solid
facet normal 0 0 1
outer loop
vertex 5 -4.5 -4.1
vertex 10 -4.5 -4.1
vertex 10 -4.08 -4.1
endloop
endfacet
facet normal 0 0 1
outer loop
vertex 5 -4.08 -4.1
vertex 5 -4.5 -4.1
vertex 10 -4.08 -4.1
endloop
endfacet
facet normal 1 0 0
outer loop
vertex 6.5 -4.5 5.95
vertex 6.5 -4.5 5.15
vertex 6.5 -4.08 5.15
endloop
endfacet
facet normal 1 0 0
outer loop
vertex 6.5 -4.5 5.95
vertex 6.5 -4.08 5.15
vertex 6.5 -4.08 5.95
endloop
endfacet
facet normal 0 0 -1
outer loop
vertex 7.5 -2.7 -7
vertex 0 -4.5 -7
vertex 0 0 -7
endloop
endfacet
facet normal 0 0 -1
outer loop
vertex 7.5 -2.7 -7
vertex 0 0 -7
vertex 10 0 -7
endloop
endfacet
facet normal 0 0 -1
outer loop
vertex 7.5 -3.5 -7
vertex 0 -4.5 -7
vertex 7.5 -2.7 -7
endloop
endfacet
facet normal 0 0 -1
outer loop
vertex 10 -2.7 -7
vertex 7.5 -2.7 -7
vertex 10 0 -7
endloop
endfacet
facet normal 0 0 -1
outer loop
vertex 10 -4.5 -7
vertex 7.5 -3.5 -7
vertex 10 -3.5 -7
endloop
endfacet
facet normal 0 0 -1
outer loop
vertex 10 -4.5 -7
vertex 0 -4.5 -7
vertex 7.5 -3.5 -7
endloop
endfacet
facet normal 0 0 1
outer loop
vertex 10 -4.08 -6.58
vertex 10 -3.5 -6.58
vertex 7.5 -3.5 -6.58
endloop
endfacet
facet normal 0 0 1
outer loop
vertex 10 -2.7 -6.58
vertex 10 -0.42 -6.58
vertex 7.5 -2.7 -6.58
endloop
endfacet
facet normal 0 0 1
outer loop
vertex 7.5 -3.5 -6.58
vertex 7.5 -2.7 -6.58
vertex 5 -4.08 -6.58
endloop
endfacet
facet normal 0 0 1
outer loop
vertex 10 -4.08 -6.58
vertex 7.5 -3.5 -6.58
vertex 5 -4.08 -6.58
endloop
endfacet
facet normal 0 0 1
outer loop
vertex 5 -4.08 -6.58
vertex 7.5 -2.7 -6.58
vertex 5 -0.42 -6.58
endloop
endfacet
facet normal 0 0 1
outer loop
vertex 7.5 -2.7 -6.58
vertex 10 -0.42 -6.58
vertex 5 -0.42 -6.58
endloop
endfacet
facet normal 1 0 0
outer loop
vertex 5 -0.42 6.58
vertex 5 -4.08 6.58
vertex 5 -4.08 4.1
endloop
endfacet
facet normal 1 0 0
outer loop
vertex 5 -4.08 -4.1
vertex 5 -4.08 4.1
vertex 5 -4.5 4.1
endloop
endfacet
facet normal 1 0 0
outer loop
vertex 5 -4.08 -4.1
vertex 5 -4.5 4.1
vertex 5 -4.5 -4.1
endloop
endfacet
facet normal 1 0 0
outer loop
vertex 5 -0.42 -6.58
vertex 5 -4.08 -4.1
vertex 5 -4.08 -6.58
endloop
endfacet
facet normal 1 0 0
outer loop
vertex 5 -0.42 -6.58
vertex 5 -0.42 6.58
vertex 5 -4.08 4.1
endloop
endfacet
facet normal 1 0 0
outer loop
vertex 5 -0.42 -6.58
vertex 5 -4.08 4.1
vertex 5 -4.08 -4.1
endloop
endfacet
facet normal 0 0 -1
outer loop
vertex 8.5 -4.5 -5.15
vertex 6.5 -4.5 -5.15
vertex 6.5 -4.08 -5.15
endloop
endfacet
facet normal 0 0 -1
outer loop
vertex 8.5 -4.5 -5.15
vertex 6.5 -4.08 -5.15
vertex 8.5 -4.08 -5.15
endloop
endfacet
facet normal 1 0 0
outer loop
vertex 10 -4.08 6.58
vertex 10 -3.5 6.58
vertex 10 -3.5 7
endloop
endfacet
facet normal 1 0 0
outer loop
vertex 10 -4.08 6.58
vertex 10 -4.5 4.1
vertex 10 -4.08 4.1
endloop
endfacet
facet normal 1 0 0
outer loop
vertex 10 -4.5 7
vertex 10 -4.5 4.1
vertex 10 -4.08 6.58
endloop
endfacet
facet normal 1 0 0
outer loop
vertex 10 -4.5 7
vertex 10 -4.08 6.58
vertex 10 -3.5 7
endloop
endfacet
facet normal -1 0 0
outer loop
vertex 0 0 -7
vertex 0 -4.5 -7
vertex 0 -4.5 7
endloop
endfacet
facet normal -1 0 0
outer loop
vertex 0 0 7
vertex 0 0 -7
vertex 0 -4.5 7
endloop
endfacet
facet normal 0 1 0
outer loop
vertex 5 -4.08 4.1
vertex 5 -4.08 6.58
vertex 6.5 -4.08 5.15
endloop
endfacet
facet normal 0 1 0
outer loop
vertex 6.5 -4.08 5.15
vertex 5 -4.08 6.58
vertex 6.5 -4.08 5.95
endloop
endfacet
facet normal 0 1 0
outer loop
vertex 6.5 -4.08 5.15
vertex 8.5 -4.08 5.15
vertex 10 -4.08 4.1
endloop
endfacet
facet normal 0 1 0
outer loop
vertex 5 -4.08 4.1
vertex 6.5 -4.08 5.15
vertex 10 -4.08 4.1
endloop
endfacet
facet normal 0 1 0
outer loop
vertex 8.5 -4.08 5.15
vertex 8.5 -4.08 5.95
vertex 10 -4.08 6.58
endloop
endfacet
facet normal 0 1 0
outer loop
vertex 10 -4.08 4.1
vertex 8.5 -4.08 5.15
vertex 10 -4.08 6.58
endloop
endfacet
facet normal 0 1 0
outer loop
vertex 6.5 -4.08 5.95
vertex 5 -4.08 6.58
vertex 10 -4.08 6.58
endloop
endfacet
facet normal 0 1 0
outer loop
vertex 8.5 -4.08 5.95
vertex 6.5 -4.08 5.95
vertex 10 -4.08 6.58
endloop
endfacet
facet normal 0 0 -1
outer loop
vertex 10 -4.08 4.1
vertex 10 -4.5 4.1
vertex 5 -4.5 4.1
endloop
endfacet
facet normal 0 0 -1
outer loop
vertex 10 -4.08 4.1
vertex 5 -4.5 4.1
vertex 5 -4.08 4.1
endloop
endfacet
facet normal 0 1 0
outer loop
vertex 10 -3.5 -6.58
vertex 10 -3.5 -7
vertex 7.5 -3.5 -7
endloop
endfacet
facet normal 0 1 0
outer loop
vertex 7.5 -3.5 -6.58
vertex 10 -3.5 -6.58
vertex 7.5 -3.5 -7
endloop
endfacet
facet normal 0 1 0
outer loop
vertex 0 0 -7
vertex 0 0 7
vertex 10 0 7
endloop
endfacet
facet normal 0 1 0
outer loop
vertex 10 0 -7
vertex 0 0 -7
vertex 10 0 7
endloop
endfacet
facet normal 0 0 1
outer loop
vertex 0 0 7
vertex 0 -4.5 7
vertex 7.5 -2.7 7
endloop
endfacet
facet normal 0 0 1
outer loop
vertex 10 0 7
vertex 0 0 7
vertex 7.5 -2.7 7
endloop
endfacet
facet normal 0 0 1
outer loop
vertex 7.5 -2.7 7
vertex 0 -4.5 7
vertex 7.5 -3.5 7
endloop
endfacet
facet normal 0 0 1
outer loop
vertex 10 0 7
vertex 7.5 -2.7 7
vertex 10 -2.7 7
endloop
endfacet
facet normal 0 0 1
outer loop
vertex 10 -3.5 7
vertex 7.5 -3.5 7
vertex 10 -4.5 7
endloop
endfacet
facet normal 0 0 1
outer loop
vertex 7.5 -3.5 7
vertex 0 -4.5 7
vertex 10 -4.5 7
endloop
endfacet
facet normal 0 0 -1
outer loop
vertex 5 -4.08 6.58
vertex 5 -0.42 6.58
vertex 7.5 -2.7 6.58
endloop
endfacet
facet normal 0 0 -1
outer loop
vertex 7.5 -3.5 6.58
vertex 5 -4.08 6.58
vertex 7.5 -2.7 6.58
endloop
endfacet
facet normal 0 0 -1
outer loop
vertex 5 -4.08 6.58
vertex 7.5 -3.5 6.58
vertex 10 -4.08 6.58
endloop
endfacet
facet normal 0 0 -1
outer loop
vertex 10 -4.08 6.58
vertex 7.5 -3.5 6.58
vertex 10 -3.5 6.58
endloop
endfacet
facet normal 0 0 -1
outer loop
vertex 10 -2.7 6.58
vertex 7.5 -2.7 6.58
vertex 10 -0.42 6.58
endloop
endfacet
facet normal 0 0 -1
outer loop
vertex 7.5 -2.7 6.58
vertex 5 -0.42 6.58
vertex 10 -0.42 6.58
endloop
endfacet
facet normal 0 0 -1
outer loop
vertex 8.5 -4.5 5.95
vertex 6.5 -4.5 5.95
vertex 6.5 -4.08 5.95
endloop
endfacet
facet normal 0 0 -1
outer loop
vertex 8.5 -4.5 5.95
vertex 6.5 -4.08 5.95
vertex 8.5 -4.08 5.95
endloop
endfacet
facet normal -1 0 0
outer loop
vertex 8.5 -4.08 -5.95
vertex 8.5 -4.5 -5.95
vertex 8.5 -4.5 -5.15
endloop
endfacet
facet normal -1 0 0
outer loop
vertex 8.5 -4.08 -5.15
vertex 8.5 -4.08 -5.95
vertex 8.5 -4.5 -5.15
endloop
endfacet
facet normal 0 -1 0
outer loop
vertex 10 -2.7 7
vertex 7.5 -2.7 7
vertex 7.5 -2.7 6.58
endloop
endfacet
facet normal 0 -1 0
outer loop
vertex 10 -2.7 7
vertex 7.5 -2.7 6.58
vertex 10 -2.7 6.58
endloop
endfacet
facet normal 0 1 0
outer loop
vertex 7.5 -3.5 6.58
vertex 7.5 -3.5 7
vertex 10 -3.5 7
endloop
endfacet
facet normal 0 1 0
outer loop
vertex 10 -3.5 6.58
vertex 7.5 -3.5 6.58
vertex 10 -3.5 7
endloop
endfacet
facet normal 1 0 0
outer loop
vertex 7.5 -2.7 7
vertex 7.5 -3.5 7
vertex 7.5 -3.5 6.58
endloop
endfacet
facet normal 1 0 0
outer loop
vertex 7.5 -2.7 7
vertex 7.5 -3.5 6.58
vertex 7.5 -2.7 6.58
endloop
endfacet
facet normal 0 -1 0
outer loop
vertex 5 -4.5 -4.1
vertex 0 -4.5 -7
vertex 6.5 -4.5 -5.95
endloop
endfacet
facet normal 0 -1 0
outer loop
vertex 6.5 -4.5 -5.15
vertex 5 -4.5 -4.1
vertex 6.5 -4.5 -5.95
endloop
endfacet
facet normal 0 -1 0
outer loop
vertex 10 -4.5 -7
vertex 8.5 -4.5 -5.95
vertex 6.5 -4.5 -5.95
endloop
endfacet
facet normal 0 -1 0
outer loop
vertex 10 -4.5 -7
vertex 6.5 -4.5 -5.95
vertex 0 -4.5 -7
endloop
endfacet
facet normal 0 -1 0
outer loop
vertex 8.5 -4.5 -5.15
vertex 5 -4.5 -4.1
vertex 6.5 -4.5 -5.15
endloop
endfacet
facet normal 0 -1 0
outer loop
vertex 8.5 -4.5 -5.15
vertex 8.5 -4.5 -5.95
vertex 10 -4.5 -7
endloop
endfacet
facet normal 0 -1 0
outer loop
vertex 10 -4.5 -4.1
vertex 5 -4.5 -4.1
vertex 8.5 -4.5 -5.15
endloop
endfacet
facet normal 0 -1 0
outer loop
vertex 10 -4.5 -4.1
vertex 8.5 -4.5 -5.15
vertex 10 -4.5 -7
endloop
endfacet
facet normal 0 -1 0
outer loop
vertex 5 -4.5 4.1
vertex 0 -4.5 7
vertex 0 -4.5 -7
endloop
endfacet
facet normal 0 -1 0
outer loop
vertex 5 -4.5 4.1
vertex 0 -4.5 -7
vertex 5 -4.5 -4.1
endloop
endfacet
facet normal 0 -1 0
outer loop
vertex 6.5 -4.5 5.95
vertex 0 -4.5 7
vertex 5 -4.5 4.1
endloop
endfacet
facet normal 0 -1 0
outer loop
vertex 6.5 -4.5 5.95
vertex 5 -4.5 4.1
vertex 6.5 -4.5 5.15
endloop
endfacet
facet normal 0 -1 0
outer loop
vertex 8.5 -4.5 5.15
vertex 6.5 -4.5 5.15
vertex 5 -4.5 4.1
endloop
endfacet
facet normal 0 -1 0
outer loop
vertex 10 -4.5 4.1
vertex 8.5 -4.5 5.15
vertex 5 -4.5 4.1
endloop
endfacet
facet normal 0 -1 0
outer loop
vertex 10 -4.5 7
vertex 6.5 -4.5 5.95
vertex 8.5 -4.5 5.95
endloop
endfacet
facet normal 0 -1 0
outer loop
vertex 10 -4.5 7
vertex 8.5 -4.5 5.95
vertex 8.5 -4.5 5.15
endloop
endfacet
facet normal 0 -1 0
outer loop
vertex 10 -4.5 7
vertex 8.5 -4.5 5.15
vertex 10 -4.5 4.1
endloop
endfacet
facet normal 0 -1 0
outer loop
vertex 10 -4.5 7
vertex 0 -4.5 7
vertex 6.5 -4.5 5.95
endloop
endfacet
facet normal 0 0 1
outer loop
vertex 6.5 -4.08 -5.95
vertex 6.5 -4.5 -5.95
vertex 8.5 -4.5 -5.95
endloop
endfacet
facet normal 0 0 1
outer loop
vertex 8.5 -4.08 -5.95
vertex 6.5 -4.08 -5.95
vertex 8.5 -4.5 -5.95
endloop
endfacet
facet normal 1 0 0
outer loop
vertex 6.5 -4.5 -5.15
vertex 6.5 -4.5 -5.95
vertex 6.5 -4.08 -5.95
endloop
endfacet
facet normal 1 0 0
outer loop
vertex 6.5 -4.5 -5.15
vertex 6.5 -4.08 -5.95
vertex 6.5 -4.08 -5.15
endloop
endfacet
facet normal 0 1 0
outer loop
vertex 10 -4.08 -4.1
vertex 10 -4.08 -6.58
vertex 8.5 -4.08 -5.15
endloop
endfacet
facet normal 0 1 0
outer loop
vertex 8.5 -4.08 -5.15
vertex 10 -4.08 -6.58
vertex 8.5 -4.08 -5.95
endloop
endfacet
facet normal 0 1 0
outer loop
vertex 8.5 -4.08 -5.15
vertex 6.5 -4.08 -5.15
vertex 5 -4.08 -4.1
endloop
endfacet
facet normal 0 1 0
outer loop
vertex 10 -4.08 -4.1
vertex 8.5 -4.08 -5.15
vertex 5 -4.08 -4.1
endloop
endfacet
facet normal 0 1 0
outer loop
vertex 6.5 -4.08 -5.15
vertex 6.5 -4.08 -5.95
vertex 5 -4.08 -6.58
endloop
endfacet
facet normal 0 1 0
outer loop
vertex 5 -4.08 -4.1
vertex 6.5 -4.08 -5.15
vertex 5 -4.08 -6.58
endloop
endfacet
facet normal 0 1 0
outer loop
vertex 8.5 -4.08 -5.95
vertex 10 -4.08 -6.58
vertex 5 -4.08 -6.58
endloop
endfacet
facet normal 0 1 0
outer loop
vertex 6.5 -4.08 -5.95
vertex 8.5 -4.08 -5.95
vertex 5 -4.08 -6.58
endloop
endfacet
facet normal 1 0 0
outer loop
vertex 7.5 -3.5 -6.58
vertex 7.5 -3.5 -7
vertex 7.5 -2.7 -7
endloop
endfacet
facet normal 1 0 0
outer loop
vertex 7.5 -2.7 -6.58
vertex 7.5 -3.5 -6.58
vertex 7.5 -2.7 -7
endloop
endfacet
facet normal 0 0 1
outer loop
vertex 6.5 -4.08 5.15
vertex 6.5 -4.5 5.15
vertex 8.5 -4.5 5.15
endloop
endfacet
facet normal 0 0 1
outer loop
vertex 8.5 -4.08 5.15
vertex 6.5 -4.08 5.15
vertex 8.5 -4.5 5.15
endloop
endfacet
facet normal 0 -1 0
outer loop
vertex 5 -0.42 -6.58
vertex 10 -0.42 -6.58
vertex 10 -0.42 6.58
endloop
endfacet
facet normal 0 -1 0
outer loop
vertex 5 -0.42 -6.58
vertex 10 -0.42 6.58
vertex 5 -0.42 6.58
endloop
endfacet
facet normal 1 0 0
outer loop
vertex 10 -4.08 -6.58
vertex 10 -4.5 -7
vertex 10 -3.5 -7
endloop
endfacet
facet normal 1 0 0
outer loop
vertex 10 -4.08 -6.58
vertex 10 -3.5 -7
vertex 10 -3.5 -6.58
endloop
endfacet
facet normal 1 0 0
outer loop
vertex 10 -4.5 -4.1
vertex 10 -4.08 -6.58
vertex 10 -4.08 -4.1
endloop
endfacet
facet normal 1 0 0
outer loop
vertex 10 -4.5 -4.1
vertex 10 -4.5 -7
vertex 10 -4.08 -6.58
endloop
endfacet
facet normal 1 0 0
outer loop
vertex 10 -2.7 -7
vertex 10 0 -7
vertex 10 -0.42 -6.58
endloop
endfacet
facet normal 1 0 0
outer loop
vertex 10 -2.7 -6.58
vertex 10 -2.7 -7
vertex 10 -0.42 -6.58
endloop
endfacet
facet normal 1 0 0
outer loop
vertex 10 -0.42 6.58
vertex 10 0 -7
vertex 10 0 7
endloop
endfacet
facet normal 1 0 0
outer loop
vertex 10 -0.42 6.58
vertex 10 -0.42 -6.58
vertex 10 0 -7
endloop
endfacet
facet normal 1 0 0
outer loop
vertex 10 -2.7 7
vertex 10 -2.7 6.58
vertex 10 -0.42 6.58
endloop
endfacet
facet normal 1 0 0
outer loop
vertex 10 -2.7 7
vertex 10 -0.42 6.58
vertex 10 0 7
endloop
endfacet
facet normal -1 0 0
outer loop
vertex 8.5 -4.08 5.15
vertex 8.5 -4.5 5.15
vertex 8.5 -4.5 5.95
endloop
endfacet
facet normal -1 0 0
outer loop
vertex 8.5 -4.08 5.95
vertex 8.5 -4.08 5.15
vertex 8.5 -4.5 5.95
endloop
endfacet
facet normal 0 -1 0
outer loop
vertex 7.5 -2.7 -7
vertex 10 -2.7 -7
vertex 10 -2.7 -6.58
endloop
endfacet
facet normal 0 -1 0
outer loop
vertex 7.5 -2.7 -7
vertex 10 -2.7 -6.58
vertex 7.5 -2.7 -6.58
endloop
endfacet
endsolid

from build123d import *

# Parameters (mm, degrees)
CROQUIS1_W              = 10
CROQUIS1_H              = 14
SALIENTE_EXTRUIR1_DEPTH = 4.5
CROQUIS2_W              = 8.2
CROQUIS2_H              = 4.08
CORTAR_EXTRUIR1_DEPTH   = 5
CORTAR_EXTRUIR2_REACH   = 19.455
CROQUIS3_W              = 5
CROQUIS3_H              = 3.66
CORTAR_EXTRUIR3_REACH   = 19.455
CROQUIS4_W              = 5
CROQUIS4_H              = 3.66
CORTAR_EXTRUIR4_REACH   = 19.783
CROQUIS5_W              = 2.5
CROQUIS5_H              = 0.8
CROQUIS6_W              = 2.5
CROQUIS6_H              = 0.8
CORTAR_EXTRUIR5_DEPTH   = 18.783419244
CORTAR_EXTRUIR6_REACH   = 15.01
CROQUIS7_W              = 2
CROQUIS7_H              = 0.8
CORTAR_EXTRUIR7_REACH   = 15.01
CROQUIS8_W              = 2
CROQUIS8_H              = 0.8


with BuildPart() as part:
    # Croquis1 → Saliente-Extruir1 (new body)
    with BuildSketch(Plane.XZ.offset(4.5)):
        with Locations((5, 0)):
            Rectangle(CROQUIS1_W, CROQUIS1_H)
    extrude(amount=-SALIENTE_EXTRUIR1_DEPTH)

    # Croquis2 → Cortar-Extruir1 (cut)
    with BuildSketch(Plane(origin=(10, 0, 0), x_dir=(0, 0, -1), z_dir=(1, 0, 0))):
        with Locations((0, -2.46)):
            Rectangle(CROQUIS2_W, CROQUIS2_H)
    extrude(amount=-CORTAR_EXTRUIR1_DEPTH, mode=Mode.SUBTRACT)

    # Croquis3 → Cortar-Extruir2 (cut, up to next)
    with BuildSketch(Plane.XY.offset(6.58), mode=Mode.PRIVATE) as cortar_extruir2_sk1:
        with Locations((7.5, -2.25)):
            Rectangle(CROQUIS3_W, CROQUIS3_H)
    cortar_extruir2_tool1 = extrude(cortar_extruir2_sk1.sketch, amount=-CORTAR_EXTRUIR2_REACH, mode=Mode.PRIVATE) & part.part
    add(cortar_extruir2_tool1.solids().sort_by_distance((7.5, -2.25, 6.58))[0], mode=Mode.SUBTRACT)

    # Croquis4 → Cortar-Extruir3 (cut, up to next)
    with BuildSketch(Plane(origin=(0, 0, -6.58), x_dir=(-1, 0, 0), z_dir=(0, 0, -1)), mode=Mode.PRIVATE) as cortar_extruir3_sk1:
        with Locations((-7.5, -2.25)):
            Rectangle(CROQUIS4_W, CROQUIS4_H)
    cortar_extruir3_tool1 = extrude(cortar_extruir3_sk1.sketch, amount=-CORTAR_EXTRUIR3_REACH, mode=Mode.PRIVATE) & part.part
    add(cortar_extruir3_tool1.solids().sort_by_distance((7.5, -2.25, -6.58))[0], mode=Mode.SUBTRACT)

    # Croquis5 → Cortar-Extruir4 (cut, up to next)
    with BuildSketch(Plane(origin=(0, 0, -7), x_dir=(-1, 0, 0), z_dir=(0, 0, -1)), mode=Mode.PRIVATE) as cortar_extruir4_sk1:
        with Locations((-8.75, -3.1)):
            Rectangle(CROQUIS5_W, CROQUIS5_H)
    cortar_extruir4_tool1 = extrude(cortar_extruir4_sk1.sketch, amount=-CORTAR_EXTRUIR4_REACH, mode=Mode.PRIVATE) & part.part
    add(cortar_extruir4_tool1.solids().sort_by_distance((8.75, -3.1, -7))[0], mode=Mode.SUBTRACT)

    # Croquis6 → Cortar-Extruir5 (cut, through all)
    with BuildSketch(Plane.XY.offset(7)):
        with Locations((8.75, -3.1)):
            Rectangle(CROQUIS6_W, CROQUIS6_H)
    extrude(amount=-CORTAR_EXTRUIR5_DEPTH, mode=Mode.SUBTRACT)

    # Croquis7 → Cortar-Extruir6 (cut, up to next)
    with BuildSketch(Plane.XZ.offset(4.5), mode=Mode.PRIVATE) as cortar_extruir6_sk1:
        with Locations((7.5, 5.55)):
            Rectangle(CROQUIS7_W, CROQUIS7_H)
    cortar_extruir6_tool1 = extrude(cortar_extruir6_sk1.sketch, amount=-CORTAR_EXTRUIR6_REACH, mode=Mode.PRIVATE) & part.part
    add(cortar_extruir6_tool1.solids().sort_by_distance((7.5, -4.5, 5.55))[0], mode=Mode.SUBTRACT)

    # Croquis8 → Cortar-Extruir7 (cut, up to next)
    with BuildSketch(Plane.XZ.offset(4.5), mode=Mode.PRIVATE) as cortar_extruir7_sk1:
        with Locations((7.5, -5.55)):
            Rectangle(CROQUIS8_W, CROQUIS8_H)
    cortar_extruir7_tool1 = extrude(cortar_extruir7_sk1.sketch, amount=-CORTAR_EXTRUIR7_REACH, mode=Mode.PRIVATE) & part.part
    add(cortar_extruir7_tool1.solids().sort_by_distance((7.5, -4.5, -5.55))[0], mode=Mode.SUBTRACT)


solid = part.part
